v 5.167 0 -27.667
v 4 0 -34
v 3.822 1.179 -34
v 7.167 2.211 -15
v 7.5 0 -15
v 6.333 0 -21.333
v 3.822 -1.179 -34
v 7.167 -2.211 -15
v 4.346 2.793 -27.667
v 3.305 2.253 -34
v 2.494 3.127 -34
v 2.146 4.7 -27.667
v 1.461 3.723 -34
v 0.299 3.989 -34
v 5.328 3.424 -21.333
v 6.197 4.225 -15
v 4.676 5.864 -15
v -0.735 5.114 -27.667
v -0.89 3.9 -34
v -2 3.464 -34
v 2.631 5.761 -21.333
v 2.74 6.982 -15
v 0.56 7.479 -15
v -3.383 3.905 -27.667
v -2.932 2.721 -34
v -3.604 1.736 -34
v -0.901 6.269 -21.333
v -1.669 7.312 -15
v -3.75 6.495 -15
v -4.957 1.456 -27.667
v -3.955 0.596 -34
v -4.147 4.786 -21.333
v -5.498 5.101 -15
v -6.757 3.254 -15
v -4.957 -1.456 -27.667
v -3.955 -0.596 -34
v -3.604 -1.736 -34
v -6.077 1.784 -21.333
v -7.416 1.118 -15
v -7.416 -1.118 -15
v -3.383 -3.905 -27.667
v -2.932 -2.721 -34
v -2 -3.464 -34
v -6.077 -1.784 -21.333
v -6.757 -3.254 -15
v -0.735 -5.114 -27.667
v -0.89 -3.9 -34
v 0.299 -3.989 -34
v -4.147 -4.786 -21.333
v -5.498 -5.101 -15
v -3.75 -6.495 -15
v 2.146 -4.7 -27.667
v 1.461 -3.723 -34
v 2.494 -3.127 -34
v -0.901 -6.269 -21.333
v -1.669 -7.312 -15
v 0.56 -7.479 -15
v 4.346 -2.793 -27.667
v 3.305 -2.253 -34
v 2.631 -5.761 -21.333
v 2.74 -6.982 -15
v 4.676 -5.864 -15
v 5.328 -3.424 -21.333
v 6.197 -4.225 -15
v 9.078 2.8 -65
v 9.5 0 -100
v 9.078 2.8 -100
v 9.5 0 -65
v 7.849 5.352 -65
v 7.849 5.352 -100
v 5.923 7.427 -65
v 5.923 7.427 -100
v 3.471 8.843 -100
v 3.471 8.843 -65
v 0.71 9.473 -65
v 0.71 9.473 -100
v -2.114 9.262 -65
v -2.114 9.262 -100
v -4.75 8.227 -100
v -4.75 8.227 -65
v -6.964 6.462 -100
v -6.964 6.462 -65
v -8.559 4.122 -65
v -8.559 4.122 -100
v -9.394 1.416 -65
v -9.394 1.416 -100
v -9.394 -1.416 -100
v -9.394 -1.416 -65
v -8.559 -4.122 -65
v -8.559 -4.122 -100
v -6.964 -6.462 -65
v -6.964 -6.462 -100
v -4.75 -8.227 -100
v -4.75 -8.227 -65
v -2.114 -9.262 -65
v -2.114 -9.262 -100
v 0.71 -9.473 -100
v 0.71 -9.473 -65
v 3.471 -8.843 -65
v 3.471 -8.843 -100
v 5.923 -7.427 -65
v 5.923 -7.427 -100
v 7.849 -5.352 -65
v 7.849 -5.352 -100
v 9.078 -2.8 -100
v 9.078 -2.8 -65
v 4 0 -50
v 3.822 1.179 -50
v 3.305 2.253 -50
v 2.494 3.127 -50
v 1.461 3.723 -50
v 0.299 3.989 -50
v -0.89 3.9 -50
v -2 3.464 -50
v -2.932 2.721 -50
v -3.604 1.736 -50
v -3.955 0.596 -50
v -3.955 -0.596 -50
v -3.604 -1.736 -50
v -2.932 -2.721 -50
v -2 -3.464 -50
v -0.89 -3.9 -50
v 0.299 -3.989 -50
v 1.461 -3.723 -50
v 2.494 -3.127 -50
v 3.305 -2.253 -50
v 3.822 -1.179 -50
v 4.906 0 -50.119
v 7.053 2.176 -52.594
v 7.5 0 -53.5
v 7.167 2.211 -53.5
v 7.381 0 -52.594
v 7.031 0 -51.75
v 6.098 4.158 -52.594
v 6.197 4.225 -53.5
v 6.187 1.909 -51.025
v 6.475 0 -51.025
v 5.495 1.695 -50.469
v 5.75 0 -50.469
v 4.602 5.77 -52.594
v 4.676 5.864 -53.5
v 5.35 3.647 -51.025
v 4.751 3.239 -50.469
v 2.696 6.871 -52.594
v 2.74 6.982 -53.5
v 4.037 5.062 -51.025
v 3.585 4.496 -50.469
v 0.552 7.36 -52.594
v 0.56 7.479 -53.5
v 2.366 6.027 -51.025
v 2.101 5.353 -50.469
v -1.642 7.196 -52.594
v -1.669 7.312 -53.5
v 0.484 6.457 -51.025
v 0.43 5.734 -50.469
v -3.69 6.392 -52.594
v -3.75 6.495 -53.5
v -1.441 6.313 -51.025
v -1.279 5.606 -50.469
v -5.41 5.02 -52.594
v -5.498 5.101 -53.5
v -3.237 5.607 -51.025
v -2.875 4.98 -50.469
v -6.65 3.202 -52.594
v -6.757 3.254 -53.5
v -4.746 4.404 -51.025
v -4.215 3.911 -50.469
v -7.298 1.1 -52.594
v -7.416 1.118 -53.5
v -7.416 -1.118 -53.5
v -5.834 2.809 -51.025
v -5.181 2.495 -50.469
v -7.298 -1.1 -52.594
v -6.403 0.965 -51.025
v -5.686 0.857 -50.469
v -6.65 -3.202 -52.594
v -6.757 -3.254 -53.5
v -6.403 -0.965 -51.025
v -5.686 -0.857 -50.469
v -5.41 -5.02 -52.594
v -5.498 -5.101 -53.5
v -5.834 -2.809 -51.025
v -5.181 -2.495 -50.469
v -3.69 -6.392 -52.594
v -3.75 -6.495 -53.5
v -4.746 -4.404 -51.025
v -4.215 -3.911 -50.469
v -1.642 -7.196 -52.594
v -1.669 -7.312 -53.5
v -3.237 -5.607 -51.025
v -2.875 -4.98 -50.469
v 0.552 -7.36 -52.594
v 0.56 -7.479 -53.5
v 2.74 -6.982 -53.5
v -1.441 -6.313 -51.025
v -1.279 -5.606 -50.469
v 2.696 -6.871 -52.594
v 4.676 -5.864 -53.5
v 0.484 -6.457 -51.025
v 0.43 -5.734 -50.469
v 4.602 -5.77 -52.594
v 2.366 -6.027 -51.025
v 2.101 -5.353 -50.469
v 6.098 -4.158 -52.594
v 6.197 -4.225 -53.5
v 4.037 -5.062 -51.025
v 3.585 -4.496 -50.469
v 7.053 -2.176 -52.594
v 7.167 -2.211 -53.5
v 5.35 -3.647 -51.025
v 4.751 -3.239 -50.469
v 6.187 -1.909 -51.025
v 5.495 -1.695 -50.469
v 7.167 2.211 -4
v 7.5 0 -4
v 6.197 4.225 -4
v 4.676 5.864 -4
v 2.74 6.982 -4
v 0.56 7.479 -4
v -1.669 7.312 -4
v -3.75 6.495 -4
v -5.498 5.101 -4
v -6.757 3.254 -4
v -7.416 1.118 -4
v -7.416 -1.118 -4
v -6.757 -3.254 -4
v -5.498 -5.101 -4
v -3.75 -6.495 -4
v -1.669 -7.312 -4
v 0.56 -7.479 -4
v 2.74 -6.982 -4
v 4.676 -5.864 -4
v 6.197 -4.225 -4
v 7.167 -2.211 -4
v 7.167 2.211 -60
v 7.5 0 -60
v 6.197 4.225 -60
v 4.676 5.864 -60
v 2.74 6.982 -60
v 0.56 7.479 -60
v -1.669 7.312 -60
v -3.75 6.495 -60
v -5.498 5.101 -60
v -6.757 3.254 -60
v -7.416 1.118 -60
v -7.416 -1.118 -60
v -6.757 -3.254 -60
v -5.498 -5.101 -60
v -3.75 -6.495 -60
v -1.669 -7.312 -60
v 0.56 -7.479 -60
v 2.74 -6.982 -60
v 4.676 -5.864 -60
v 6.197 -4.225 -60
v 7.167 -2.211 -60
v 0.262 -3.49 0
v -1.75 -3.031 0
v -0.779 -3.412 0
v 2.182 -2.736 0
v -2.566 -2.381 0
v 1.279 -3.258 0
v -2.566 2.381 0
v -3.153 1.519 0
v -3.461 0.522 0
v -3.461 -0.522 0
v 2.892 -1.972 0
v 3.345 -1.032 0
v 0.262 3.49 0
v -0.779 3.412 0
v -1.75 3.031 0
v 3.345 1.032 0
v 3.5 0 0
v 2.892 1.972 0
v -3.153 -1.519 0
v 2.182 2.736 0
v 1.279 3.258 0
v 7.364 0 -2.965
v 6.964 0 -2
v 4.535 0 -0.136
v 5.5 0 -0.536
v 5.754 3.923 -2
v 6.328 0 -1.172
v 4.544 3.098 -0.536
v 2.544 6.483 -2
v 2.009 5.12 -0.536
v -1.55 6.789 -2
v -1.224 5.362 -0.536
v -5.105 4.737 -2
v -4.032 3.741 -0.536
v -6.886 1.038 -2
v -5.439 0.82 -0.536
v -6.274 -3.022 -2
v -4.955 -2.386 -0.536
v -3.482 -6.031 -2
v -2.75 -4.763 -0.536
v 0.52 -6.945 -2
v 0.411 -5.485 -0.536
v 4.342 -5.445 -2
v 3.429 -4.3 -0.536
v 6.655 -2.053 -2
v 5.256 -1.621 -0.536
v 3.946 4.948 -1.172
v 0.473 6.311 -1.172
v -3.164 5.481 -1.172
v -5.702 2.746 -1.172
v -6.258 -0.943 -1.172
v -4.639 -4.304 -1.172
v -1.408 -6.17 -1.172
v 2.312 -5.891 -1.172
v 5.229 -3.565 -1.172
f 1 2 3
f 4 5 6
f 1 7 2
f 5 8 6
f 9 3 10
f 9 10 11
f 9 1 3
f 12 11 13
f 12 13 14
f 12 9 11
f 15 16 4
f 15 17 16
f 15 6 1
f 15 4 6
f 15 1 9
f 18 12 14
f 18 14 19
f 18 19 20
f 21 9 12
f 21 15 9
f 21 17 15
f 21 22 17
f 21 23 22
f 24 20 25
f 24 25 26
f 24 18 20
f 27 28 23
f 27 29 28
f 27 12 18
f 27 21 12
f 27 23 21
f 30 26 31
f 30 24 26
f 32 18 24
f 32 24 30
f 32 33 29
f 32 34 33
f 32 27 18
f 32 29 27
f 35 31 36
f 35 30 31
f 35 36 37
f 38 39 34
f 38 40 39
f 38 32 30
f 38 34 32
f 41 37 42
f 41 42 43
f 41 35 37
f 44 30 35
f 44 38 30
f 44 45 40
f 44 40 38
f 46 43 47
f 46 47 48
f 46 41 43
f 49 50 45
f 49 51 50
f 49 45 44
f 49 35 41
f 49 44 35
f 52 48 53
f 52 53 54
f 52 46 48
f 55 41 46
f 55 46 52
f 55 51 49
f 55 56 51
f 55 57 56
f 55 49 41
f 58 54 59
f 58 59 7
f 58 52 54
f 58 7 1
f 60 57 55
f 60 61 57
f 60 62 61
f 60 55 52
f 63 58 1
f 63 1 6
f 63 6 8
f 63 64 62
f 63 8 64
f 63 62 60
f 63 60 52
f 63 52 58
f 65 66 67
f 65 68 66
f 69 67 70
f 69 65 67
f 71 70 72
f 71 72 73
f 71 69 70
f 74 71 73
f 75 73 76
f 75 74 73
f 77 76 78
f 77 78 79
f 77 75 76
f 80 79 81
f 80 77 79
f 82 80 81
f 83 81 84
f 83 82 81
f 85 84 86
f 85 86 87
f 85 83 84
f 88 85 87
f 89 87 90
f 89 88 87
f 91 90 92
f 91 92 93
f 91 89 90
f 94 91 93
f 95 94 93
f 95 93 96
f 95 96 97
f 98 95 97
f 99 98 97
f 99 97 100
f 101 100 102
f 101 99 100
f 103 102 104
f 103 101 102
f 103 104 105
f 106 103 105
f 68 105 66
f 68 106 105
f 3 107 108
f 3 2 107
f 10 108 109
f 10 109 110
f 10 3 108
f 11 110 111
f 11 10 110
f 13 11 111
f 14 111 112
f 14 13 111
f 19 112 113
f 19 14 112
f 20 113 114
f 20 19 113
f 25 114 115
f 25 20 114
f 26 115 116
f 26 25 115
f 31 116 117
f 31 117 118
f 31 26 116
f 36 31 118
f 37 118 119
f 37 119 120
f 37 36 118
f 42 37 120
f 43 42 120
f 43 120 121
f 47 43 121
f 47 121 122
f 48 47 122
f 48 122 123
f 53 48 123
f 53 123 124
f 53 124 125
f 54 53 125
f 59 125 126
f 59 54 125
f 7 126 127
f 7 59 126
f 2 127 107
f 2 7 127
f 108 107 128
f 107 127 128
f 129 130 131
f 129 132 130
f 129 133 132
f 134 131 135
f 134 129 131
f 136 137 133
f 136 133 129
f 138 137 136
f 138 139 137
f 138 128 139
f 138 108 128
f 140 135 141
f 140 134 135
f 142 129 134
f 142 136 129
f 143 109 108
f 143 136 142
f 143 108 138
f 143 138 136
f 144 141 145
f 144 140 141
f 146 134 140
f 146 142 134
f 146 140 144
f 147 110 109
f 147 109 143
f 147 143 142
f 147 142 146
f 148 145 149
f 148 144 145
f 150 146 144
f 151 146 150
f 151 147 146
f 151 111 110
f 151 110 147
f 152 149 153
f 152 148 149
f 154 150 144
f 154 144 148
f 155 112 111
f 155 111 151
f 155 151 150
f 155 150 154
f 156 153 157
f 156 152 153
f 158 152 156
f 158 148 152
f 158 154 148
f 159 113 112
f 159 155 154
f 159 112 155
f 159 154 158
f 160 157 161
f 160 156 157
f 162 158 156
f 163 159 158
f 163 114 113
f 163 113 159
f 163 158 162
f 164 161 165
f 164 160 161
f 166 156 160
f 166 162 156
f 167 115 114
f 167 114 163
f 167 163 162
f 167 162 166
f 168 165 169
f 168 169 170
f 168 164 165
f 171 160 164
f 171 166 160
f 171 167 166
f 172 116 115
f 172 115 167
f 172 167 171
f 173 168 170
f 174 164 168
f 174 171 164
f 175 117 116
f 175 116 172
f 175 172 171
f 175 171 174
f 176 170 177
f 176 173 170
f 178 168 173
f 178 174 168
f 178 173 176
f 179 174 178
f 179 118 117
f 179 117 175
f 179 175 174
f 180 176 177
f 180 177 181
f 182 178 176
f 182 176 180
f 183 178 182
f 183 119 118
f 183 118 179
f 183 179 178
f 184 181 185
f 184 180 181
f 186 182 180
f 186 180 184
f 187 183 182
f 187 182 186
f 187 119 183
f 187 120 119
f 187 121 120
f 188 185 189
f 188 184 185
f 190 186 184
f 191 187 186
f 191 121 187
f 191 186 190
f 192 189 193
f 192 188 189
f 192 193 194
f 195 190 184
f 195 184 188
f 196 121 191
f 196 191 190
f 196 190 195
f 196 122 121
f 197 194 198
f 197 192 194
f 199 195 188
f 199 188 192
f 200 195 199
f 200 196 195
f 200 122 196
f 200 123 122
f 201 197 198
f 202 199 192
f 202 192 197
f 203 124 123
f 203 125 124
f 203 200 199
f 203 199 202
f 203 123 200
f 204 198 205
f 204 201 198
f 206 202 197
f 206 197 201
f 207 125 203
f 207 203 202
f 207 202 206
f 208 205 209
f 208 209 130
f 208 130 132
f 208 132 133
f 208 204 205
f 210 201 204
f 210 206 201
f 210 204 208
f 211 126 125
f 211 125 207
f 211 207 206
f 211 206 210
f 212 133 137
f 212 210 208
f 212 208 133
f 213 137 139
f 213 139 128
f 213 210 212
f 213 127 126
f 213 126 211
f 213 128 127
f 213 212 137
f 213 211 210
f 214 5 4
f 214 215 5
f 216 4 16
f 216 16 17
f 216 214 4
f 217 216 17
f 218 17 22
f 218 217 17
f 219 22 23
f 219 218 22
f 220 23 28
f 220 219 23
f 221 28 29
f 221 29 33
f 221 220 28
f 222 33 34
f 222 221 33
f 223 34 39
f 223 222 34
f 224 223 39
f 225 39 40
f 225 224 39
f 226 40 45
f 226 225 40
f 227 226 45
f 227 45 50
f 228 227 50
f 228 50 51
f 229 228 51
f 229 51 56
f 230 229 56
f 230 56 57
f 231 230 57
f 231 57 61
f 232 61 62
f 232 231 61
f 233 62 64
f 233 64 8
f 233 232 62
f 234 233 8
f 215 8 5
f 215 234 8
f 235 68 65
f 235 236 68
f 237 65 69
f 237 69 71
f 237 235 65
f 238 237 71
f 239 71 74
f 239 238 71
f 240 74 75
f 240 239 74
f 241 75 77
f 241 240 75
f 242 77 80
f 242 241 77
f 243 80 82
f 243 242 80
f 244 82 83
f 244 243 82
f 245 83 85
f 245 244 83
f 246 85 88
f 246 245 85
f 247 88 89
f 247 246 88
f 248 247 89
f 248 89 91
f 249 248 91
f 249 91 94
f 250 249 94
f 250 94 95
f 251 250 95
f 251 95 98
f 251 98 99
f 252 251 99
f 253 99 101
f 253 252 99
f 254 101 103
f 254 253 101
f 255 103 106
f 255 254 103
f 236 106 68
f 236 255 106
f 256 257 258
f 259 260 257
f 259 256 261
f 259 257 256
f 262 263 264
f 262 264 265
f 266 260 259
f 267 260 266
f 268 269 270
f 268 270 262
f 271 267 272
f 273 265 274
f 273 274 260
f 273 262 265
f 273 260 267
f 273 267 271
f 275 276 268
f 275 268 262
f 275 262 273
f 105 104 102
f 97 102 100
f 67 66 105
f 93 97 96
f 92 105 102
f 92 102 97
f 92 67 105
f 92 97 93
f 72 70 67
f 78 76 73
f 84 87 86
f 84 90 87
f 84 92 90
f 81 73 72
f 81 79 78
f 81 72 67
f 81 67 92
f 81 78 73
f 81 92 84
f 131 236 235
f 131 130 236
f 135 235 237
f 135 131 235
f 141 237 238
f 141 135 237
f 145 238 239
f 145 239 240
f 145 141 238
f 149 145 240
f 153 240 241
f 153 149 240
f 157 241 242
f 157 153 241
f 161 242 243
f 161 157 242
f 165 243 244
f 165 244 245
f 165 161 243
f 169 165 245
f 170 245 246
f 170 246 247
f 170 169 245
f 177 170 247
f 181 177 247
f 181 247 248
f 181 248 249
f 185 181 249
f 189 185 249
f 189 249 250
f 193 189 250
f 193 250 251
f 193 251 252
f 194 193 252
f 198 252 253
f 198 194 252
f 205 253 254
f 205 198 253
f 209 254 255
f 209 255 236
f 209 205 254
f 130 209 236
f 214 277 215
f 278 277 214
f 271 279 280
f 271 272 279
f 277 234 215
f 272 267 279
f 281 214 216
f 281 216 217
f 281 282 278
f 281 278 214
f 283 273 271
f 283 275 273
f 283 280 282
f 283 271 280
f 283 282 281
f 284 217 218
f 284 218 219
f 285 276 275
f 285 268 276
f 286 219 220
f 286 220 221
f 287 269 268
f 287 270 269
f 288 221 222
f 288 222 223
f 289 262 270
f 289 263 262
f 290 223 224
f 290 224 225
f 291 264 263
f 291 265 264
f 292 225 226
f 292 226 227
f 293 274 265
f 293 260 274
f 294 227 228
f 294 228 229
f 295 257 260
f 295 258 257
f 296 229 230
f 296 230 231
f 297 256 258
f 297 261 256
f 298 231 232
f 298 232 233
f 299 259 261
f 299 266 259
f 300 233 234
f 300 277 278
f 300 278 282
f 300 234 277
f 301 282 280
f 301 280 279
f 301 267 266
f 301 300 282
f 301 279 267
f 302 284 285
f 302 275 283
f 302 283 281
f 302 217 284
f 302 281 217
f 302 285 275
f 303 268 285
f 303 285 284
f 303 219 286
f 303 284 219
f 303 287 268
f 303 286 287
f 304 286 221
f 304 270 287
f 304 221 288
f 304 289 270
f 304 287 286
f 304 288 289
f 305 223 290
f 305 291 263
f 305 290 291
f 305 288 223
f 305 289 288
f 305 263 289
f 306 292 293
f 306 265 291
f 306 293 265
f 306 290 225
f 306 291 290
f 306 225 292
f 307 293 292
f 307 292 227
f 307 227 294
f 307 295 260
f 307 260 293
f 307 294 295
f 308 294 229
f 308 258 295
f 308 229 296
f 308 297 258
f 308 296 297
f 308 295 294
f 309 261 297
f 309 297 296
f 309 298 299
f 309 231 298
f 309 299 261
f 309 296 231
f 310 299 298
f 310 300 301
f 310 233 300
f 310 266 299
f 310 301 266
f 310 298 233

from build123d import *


with BuildPart() as f1:
    # F0 (on Front) → F1 (revolve)
    with BuildSketch(Plane.XZ):
        with BuildLine():
            Line((3.5, 0), (0, 0))
            Line((0, 0), (0, -100))
            Line((0, -100), (9.5, -100))
            Line((9.5, -100), (9.5, -65))
            Line((9.5, -65), (7.5, -60))
            Line((7.5, -60), (7.5, -53.5))
            ThreePointArc((7.5, -53.5), (6.474874, -51.025126), (4, -50))
            Line((4, -50), (4, -34))
            Line((4, -34), (7.5, -15))
            Line((7.5, -15), (7.5, -4))
            ThreePointArc((7.5, -4), (6.328427, -1.171573), (3.5, 0))
        make_face()
    revolve(axis=Axis((0, 0, -50), (0, 0, 1)))


solid = f1.part
